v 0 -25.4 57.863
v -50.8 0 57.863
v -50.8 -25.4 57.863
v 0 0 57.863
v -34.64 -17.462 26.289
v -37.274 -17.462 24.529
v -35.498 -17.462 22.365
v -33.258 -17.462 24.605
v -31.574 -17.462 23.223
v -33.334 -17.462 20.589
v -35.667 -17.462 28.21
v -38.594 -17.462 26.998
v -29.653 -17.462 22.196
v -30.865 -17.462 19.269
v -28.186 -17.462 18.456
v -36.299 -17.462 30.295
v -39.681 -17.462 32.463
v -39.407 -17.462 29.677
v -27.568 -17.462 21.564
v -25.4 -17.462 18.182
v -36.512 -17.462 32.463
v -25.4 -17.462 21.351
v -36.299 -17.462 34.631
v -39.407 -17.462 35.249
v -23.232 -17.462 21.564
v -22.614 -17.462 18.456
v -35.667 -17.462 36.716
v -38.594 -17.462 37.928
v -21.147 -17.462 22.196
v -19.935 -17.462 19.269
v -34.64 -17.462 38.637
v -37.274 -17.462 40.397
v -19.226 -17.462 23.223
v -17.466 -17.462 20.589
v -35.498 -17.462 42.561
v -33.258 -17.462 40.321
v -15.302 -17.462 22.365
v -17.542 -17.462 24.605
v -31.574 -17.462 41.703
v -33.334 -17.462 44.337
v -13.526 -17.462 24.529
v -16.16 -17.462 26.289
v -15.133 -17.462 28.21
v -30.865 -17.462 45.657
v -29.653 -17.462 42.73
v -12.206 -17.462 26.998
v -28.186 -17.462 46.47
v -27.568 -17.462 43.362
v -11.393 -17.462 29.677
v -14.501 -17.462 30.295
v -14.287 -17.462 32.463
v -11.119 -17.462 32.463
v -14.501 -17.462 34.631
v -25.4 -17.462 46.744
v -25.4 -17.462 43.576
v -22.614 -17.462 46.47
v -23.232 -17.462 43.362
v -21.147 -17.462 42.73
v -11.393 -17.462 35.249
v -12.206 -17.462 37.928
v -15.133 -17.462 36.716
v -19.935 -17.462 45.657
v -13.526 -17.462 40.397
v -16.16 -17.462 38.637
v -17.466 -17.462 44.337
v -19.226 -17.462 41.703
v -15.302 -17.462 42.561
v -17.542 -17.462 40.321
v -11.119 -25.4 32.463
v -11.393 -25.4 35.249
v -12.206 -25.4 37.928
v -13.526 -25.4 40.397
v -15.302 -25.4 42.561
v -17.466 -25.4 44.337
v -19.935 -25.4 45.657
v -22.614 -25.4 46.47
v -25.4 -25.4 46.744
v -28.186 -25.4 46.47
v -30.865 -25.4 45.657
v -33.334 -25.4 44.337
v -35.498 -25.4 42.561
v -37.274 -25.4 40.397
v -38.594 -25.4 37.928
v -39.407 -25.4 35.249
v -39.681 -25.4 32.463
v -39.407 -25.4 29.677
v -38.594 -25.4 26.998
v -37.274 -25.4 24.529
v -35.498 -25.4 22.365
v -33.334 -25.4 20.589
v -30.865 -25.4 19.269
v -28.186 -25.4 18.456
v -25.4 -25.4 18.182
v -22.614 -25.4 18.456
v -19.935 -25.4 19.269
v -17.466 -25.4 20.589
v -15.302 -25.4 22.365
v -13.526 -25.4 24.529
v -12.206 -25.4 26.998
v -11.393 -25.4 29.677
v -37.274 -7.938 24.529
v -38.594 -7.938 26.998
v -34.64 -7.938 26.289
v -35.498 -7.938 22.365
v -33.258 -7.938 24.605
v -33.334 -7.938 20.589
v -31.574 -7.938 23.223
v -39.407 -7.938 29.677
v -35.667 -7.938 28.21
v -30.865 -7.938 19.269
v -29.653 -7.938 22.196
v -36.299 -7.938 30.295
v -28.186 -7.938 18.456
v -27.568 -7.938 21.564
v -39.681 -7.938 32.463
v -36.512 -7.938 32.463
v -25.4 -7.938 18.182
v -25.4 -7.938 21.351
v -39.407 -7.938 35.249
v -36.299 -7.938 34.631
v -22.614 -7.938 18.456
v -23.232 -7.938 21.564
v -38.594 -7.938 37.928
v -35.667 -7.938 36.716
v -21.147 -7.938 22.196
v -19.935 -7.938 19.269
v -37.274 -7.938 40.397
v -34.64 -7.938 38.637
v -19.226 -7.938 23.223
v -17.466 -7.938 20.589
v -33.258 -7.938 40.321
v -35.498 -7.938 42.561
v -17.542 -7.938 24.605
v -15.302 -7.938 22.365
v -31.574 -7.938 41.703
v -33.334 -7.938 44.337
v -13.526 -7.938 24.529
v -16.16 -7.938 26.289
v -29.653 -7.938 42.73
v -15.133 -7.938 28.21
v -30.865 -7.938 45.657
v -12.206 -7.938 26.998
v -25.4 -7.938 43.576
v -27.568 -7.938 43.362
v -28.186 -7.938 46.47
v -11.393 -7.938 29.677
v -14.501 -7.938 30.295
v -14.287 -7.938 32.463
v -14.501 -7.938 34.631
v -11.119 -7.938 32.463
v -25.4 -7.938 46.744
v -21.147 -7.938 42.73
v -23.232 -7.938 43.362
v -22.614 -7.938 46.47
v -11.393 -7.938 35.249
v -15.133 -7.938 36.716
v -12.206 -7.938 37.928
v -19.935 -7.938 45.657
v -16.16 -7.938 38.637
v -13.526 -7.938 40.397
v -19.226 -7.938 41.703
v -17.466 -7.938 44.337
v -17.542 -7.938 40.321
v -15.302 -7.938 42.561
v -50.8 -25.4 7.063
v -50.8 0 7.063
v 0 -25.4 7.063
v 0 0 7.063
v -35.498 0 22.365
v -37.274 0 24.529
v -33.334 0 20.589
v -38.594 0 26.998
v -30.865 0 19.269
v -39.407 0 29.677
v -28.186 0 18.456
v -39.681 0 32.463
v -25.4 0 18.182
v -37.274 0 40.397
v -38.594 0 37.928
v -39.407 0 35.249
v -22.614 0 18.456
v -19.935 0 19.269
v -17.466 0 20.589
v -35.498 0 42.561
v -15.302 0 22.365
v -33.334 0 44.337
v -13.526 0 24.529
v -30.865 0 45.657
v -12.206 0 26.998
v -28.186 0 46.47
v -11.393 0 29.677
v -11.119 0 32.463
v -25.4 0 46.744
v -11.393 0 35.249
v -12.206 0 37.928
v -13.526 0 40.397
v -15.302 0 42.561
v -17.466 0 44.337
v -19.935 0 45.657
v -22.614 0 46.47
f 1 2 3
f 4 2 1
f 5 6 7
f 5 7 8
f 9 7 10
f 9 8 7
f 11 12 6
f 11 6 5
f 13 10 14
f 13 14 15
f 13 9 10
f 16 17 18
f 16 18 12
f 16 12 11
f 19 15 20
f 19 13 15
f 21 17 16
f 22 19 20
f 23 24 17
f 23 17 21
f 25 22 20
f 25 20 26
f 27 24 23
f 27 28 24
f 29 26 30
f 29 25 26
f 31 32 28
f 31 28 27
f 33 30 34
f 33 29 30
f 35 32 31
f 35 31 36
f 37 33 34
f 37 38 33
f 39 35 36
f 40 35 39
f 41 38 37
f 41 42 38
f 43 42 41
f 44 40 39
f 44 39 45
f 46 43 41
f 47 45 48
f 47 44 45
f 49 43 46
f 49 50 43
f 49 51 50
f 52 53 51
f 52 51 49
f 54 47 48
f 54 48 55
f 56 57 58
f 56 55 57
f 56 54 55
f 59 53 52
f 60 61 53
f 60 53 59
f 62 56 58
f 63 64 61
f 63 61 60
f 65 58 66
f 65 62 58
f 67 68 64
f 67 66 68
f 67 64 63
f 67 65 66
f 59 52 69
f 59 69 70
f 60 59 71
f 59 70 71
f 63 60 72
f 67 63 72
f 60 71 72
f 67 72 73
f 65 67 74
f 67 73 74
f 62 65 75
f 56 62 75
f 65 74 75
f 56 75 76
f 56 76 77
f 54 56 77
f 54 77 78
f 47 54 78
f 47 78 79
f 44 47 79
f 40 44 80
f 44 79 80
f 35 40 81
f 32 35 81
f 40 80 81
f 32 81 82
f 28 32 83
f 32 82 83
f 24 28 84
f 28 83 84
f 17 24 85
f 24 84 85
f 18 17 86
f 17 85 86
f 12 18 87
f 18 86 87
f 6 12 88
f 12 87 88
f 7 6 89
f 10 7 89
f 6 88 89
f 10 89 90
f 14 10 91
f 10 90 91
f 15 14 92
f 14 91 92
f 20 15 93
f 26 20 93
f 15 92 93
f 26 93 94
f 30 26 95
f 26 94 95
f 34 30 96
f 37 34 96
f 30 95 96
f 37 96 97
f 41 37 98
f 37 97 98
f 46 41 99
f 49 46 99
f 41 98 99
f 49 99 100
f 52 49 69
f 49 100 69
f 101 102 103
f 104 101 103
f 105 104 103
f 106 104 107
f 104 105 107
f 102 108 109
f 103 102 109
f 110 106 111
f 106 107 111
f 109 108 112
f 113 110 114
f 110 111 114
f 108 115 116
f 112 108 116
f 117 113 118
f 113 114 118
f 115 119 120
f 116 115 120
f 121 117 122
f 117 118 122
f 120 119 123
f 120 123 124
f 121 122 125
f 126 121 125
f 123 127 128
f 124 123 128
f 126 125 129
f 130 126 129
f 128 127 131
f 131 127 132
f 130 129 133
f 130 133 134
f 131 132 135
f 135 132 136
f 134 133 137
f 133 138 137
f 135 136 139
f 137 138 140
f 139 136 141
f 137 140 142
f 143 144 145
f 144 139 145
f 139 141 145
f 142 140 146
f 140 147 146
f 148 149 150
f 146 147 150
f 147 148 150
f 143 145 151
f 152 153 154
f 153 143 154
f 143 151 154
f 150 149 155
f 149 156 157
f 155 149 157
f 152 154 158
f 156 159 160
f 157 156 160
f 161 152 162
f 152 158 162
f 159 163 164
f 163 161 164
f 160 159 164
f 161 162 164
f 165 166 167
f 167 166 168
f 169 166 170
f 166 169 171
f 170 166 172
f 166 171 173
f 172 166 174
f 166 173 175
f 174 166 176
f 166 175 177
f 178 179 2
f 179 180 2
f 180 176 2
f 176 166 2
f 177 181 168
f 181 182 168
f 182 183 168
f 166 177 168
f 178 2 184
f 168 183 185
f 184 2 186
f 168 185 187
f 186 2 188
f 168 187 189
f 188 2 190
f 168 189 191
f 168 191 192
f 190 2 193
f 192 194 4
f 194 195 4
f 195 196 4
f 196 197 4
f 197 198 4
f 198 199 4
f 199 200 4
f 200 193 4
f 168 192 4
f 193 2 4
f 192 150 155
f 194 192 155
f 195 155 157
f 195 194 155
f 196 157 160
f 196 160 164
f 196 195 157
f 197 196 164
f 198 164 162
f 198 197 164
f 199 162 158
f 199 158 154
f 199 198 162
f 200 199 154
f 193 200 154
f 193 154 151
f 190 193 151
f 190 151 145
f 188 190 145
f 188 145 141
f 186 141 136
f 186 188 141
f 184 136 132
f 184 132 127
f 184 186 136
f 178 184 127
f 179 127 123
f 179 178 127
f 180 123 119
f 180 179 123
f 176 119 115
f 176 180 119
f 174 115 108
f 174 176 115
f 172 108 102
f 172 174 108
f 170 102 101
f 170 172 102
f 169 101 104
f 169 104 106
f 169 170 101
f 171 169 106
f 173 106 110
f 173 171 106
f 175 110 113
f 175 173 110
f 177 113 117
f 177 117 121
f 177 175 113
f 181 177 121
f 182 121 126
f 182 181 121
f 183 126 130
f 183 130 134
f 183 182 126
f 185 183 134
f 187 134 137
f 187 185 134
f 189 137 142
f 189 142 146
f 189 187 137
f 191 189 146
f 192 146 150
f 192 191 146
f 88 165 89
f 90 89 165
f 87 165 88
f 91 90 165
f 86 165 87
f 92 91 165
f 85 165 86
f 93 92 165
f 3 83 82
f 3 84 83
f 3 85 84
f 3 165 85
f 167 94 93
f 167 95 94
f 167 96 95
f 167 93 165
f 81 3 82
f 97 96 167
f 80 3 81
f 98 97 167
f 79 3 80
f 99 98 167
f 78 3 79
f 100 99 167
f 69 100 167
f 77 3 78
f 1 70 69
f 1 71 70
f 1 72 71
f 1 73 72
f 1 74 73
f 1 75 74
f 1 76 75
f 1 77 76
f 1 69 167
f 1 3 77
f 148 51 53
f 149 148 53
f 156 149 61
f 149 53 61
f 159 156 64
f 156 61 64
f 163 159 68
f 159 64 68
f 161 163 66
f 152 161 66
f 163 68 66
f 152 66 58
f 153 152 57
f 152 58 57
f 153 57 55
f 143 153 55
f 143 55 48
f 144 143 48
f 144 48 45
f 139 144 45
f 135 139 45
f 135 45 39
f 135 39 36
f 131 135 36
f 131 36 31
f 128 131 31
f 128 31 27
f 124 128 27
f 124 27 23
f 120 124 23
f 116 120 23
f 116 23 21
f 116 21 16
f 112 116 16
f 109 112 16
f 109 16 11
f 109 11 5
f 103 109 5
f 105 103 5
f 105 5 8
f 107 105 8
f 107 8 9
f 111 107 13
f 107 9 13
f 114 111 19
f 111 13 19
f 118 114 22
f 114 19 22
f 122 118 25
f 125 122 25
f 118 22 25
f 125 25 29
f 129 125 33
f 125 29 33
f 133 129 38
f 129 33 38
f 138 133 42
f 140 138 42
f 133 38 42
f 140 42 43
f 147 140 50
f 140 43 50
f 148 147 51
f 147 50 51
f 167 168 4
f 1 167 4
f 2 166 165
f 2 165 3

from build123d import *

# Parameters (mm, degrees)
F0_W     = 50.8
F0_H     = 50.8
F2_DEPTH = 25.4
F1_R     = 14.28115
F3_DEPTH = 7.9375
F4_R     = 14.28115
F5_DEPTH = 7.9375
F6_R     = 11.1125
F7_DEPTH = 25.4


with BuildPart() as f2:
    # F0 (on Front) → F2 (new body)
    with BuildSketch(Plane.XZ):
        with Locations((-25.4, 32.4630600569)):
            Rectangle(F0_W, F0_H)
    extrude(amount=F2_DEPTH)

    # F1 (on Front) → F3 (cut)
    with BuildSketch(Plane.XZ):
        with Locations((-25.4, 32.4630600569)):
            Circle(F1_R)
    extrude(amount=F3_DEPTH, mode=Mode.SUBTRACT)

    # F4 (on face) → F5 (cut)
    with BuildSketch(Plane.XZ.offset(25.4)):
        with Locations((-25.4, 32.4630600569)):
            Circle(F4_R)
    extrude(amount=-F5_DEPTH, mode=Mode.SUBTRACT)

    # F6 (on face) → F7 (cut)
    with BuildSketch(Plane.XZ.offset(17.4625)):
        with Locations((-25.4, 32.4630600569)):
            Circle(F6_R)
    extrude(amount=-F7_DEPTH, mode=Mode.SUBTRACT)


solid = f2.part
